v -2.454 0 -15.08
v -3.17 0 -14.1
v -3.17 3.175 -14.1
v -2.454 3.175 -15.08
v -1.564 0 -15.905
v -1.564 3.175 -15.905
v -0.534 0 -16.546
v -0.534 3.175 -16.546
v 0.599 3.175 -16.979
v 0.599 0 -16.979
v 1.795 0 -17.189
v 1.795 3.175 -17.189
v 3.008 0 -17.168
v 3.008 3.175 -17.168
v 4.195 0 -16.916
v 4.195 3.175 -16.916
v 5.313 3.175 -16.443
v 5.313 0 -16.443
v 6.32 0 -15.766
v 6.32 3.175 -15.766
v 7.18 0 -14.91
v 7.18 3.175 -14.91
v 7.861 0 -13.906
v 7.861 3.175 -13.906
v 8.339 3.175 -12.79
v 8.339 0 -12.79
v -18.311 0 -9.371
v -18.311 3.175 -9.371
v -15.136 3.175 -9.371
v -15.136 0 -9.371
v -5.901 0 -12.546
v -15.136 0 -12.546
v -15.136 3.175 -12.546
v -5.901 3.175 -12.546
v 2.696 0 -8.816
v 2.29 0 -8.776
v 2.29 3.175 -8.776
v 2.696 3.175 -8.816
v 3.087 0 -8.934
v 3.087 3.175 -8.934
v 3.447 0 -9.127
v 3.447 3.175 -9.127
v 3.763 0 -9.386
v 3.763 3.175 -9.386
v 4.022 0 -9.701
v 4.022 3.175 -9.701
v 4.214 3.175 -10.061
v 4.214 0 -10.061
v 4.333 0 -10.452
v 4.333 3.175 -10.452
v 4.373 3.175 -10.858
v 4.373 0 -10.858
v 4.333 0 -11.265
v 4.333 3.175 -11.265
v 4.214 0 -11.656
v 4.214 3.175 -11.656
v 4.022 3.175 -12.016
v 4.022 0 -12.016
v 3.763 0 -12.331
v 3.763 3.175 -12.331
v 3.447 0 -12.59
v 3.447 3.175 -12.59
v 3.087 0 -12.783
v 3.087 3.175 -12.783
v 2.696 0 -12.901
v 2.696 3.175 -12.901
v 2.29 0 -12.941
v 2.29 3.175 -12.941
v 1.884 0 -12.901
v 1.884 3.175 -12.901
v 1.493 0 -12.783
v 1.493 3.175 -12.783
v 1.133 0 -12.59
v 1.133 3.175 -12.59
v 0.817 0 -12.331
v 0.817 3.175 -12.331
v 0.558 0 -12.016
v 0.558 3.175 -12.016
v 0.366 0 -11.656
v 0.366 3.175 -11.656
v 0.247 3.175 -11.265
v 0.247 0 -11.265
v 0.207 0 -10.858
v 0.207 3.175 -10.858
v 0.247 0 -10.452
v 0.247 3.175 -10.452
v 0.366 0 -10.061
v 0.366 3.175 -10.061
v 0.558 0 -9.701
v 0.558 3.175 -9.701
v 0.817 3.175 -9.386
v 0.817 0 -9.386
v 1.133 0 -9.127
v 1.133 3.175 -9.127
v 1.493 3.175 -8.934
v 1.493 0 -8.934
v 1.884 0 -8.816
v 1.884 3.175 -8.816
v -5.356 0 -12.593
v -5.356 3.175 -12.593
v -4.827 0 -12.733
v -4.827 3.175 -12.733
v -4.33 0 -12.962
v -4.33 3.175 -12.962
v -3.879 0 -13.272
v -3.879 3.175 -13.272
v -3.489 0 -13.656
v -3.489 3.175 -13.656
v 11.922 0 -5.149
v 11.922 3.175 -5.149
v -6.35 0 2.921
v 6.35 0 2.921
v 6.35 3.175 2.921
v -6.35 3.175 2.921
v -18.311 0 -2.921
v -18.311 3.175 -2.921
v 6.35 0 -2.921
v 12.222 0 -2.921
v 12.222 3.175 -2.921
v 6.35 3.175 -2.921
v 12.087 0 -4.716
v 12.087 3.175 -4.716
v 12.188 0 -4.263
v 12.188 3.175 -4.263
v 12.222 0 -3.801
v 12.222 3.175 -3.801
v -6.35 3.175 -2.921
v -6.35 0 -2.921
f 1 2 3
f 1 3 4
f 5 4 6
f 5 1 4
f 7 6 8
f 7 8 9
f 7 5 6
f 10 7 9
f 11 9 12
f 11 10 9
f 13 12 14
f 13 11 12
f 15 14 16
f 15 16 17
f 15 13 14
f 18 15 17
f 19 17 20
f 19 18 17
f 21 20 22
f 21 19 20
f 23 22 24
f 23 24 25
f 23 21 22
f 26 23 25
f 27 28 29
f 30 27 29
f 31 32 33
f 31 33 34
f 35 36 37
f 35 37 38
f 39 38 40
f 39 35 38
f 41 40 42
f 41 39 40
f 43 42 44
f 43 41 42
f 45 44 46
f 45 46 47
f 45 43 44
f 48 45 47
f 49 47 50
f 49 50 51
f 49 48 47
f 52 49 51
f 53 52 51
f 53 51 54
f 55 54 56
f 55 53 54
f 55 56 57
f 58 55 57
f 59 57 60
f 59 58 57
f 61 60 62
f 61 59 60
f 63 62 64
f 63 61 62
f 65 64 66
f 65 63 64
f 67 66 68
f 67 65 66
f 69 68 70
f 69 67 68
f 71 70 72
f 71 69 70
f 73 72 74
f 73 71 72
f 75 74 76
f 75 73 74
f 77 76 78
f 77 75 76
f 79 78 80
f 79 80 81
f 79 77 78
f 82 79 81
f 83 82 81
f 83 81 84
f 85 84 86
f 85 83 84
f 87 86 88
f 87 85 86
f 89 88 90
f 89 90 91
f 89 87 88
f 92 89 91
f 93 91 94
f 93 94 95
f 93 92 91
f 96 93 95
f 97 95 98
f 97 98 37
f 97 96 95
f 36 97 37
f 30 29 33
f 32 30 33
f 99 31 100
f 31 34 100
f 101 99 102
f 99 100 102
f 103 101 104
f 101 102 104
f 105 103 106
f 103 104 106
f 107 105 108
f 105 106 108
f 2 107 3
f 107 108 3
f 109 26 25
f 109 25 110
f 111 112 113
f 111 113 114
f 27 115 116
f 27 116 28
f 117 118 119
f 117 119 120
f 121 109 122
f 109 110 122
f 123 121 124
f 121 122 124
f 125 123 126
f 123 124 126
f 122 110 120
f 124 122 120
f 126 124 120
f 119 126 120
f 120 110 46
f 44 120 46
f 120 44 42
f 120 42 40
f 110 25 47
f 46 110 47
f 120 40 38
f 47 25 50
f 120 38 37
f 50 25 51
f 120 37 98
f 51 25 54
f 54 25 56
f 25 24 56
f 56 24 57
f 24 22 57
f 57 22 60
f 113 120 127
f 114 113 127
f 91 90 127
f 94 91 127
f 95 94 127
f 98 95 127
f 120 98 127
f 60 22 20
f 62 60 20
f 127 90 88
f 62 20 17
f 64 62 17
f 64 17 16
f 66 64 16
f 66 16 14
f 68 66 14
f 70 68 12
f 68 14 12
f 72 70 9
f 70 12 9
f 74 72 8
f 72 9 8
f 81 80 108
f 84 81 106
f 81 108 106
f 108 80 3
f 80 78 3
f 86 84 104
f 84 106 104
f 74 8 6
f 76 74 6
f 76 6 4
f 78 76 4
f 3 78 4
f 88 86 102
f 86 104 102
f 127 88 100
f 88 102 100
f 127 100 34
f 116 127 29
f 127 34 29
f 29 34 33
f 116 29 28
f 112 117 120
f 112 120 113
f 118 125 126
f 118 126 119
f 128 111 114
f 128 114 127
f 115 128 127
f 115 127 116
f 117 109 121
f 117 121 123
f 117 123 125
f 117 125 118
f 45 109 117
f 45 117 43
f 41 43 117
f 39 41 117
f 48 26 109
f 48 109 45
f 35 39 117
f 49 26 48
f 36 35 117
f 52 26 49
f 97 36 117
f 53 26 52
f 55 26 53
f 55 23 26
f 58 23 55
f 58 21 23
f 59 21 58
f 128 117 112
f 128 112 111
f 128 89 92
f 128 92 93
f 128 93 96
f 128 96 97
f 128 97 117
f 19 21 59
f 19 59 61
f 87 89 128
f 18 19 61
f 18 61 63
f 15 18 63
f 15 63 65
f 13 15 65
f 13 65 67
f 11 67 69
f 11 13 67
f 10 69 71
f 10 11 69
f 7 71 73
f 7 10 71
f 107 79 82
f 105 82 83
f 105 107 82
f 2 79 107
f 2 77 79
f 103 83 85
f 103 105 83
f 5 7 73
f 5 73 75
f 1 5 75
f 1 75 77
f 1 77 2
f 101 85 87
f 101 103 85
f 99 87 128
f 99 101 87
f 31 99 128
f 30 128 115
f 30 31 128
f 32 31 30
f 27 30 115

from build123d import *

# Parameters (mm, degrees)
SKETCH1_R           = 2.0828
BOSS_EXTRUDE1_DEPTH = 3.175
FILLET1_R           = 3.175


with BuildPart() as part:
    # Sketch1 → Boss-Extrude1 (new body)
    with BuildSketch(Plane(origin=(0, 0, 0), x_dir=(1, 0, 0), z_dir=(0, 1, 0))):
        with BuildLine():
            Line((-15.950085837, 2.921), (-18.3111574, 2.921))
            Line((-18.3111574, 2.921), (-18.3111574, 9.371))
            Line((-18.3111574, 9.371), (-15.1361574, 9.371))
            Line((-15.1361574, 9.371), (-15.1361574, 12.546))
            Line((-15.1361574, 12.546), (-13.204371576, 12.546))
            Line((-13.204371576, 12.546), (-3.831834579, 12.546))
            ThreePointArc((-3.831834579, 12.546), (2.162458915, 17.20722233), (8.338892533, 12.790185329))
            Line((8.338892533, 12.790185329), (12.221790763, 4.5085))
            Line((12.221790763, 4.5085), (12.221790763, 2.921))
            Line((12.221790763, 2.921), (6.35, 2.921))
            Line((6.35, 2.921), (6.35, -2.921))
            Line((6.35, -2.921), (-6.35, -2.921))
            Line((-6.35, -2.921), (-6.35, 2.921))
            Line((-6.35, 2.921), (-15.950085837, 2.921))
        make_face()
        with Locations(Location((2.289835434, 10.8585, 0), (0, 0, 270))):
            Circle(SKETCH1_R, mode=Mode.SUBTRACT)
    extrude(amount=BOSS_EXTRUDE1_DEPTH)

    # Fillet1
    fillet1_edges = [part.edges().sort_by_distance(p)[0] for p in [
        (-3.831834579, 1.5875, -12.546),
        (12.221790763, 1.5875, -4.5085),
    ]]
    fillet(fillet1_edges, radius=FILLET1_R)


solid = part.part
